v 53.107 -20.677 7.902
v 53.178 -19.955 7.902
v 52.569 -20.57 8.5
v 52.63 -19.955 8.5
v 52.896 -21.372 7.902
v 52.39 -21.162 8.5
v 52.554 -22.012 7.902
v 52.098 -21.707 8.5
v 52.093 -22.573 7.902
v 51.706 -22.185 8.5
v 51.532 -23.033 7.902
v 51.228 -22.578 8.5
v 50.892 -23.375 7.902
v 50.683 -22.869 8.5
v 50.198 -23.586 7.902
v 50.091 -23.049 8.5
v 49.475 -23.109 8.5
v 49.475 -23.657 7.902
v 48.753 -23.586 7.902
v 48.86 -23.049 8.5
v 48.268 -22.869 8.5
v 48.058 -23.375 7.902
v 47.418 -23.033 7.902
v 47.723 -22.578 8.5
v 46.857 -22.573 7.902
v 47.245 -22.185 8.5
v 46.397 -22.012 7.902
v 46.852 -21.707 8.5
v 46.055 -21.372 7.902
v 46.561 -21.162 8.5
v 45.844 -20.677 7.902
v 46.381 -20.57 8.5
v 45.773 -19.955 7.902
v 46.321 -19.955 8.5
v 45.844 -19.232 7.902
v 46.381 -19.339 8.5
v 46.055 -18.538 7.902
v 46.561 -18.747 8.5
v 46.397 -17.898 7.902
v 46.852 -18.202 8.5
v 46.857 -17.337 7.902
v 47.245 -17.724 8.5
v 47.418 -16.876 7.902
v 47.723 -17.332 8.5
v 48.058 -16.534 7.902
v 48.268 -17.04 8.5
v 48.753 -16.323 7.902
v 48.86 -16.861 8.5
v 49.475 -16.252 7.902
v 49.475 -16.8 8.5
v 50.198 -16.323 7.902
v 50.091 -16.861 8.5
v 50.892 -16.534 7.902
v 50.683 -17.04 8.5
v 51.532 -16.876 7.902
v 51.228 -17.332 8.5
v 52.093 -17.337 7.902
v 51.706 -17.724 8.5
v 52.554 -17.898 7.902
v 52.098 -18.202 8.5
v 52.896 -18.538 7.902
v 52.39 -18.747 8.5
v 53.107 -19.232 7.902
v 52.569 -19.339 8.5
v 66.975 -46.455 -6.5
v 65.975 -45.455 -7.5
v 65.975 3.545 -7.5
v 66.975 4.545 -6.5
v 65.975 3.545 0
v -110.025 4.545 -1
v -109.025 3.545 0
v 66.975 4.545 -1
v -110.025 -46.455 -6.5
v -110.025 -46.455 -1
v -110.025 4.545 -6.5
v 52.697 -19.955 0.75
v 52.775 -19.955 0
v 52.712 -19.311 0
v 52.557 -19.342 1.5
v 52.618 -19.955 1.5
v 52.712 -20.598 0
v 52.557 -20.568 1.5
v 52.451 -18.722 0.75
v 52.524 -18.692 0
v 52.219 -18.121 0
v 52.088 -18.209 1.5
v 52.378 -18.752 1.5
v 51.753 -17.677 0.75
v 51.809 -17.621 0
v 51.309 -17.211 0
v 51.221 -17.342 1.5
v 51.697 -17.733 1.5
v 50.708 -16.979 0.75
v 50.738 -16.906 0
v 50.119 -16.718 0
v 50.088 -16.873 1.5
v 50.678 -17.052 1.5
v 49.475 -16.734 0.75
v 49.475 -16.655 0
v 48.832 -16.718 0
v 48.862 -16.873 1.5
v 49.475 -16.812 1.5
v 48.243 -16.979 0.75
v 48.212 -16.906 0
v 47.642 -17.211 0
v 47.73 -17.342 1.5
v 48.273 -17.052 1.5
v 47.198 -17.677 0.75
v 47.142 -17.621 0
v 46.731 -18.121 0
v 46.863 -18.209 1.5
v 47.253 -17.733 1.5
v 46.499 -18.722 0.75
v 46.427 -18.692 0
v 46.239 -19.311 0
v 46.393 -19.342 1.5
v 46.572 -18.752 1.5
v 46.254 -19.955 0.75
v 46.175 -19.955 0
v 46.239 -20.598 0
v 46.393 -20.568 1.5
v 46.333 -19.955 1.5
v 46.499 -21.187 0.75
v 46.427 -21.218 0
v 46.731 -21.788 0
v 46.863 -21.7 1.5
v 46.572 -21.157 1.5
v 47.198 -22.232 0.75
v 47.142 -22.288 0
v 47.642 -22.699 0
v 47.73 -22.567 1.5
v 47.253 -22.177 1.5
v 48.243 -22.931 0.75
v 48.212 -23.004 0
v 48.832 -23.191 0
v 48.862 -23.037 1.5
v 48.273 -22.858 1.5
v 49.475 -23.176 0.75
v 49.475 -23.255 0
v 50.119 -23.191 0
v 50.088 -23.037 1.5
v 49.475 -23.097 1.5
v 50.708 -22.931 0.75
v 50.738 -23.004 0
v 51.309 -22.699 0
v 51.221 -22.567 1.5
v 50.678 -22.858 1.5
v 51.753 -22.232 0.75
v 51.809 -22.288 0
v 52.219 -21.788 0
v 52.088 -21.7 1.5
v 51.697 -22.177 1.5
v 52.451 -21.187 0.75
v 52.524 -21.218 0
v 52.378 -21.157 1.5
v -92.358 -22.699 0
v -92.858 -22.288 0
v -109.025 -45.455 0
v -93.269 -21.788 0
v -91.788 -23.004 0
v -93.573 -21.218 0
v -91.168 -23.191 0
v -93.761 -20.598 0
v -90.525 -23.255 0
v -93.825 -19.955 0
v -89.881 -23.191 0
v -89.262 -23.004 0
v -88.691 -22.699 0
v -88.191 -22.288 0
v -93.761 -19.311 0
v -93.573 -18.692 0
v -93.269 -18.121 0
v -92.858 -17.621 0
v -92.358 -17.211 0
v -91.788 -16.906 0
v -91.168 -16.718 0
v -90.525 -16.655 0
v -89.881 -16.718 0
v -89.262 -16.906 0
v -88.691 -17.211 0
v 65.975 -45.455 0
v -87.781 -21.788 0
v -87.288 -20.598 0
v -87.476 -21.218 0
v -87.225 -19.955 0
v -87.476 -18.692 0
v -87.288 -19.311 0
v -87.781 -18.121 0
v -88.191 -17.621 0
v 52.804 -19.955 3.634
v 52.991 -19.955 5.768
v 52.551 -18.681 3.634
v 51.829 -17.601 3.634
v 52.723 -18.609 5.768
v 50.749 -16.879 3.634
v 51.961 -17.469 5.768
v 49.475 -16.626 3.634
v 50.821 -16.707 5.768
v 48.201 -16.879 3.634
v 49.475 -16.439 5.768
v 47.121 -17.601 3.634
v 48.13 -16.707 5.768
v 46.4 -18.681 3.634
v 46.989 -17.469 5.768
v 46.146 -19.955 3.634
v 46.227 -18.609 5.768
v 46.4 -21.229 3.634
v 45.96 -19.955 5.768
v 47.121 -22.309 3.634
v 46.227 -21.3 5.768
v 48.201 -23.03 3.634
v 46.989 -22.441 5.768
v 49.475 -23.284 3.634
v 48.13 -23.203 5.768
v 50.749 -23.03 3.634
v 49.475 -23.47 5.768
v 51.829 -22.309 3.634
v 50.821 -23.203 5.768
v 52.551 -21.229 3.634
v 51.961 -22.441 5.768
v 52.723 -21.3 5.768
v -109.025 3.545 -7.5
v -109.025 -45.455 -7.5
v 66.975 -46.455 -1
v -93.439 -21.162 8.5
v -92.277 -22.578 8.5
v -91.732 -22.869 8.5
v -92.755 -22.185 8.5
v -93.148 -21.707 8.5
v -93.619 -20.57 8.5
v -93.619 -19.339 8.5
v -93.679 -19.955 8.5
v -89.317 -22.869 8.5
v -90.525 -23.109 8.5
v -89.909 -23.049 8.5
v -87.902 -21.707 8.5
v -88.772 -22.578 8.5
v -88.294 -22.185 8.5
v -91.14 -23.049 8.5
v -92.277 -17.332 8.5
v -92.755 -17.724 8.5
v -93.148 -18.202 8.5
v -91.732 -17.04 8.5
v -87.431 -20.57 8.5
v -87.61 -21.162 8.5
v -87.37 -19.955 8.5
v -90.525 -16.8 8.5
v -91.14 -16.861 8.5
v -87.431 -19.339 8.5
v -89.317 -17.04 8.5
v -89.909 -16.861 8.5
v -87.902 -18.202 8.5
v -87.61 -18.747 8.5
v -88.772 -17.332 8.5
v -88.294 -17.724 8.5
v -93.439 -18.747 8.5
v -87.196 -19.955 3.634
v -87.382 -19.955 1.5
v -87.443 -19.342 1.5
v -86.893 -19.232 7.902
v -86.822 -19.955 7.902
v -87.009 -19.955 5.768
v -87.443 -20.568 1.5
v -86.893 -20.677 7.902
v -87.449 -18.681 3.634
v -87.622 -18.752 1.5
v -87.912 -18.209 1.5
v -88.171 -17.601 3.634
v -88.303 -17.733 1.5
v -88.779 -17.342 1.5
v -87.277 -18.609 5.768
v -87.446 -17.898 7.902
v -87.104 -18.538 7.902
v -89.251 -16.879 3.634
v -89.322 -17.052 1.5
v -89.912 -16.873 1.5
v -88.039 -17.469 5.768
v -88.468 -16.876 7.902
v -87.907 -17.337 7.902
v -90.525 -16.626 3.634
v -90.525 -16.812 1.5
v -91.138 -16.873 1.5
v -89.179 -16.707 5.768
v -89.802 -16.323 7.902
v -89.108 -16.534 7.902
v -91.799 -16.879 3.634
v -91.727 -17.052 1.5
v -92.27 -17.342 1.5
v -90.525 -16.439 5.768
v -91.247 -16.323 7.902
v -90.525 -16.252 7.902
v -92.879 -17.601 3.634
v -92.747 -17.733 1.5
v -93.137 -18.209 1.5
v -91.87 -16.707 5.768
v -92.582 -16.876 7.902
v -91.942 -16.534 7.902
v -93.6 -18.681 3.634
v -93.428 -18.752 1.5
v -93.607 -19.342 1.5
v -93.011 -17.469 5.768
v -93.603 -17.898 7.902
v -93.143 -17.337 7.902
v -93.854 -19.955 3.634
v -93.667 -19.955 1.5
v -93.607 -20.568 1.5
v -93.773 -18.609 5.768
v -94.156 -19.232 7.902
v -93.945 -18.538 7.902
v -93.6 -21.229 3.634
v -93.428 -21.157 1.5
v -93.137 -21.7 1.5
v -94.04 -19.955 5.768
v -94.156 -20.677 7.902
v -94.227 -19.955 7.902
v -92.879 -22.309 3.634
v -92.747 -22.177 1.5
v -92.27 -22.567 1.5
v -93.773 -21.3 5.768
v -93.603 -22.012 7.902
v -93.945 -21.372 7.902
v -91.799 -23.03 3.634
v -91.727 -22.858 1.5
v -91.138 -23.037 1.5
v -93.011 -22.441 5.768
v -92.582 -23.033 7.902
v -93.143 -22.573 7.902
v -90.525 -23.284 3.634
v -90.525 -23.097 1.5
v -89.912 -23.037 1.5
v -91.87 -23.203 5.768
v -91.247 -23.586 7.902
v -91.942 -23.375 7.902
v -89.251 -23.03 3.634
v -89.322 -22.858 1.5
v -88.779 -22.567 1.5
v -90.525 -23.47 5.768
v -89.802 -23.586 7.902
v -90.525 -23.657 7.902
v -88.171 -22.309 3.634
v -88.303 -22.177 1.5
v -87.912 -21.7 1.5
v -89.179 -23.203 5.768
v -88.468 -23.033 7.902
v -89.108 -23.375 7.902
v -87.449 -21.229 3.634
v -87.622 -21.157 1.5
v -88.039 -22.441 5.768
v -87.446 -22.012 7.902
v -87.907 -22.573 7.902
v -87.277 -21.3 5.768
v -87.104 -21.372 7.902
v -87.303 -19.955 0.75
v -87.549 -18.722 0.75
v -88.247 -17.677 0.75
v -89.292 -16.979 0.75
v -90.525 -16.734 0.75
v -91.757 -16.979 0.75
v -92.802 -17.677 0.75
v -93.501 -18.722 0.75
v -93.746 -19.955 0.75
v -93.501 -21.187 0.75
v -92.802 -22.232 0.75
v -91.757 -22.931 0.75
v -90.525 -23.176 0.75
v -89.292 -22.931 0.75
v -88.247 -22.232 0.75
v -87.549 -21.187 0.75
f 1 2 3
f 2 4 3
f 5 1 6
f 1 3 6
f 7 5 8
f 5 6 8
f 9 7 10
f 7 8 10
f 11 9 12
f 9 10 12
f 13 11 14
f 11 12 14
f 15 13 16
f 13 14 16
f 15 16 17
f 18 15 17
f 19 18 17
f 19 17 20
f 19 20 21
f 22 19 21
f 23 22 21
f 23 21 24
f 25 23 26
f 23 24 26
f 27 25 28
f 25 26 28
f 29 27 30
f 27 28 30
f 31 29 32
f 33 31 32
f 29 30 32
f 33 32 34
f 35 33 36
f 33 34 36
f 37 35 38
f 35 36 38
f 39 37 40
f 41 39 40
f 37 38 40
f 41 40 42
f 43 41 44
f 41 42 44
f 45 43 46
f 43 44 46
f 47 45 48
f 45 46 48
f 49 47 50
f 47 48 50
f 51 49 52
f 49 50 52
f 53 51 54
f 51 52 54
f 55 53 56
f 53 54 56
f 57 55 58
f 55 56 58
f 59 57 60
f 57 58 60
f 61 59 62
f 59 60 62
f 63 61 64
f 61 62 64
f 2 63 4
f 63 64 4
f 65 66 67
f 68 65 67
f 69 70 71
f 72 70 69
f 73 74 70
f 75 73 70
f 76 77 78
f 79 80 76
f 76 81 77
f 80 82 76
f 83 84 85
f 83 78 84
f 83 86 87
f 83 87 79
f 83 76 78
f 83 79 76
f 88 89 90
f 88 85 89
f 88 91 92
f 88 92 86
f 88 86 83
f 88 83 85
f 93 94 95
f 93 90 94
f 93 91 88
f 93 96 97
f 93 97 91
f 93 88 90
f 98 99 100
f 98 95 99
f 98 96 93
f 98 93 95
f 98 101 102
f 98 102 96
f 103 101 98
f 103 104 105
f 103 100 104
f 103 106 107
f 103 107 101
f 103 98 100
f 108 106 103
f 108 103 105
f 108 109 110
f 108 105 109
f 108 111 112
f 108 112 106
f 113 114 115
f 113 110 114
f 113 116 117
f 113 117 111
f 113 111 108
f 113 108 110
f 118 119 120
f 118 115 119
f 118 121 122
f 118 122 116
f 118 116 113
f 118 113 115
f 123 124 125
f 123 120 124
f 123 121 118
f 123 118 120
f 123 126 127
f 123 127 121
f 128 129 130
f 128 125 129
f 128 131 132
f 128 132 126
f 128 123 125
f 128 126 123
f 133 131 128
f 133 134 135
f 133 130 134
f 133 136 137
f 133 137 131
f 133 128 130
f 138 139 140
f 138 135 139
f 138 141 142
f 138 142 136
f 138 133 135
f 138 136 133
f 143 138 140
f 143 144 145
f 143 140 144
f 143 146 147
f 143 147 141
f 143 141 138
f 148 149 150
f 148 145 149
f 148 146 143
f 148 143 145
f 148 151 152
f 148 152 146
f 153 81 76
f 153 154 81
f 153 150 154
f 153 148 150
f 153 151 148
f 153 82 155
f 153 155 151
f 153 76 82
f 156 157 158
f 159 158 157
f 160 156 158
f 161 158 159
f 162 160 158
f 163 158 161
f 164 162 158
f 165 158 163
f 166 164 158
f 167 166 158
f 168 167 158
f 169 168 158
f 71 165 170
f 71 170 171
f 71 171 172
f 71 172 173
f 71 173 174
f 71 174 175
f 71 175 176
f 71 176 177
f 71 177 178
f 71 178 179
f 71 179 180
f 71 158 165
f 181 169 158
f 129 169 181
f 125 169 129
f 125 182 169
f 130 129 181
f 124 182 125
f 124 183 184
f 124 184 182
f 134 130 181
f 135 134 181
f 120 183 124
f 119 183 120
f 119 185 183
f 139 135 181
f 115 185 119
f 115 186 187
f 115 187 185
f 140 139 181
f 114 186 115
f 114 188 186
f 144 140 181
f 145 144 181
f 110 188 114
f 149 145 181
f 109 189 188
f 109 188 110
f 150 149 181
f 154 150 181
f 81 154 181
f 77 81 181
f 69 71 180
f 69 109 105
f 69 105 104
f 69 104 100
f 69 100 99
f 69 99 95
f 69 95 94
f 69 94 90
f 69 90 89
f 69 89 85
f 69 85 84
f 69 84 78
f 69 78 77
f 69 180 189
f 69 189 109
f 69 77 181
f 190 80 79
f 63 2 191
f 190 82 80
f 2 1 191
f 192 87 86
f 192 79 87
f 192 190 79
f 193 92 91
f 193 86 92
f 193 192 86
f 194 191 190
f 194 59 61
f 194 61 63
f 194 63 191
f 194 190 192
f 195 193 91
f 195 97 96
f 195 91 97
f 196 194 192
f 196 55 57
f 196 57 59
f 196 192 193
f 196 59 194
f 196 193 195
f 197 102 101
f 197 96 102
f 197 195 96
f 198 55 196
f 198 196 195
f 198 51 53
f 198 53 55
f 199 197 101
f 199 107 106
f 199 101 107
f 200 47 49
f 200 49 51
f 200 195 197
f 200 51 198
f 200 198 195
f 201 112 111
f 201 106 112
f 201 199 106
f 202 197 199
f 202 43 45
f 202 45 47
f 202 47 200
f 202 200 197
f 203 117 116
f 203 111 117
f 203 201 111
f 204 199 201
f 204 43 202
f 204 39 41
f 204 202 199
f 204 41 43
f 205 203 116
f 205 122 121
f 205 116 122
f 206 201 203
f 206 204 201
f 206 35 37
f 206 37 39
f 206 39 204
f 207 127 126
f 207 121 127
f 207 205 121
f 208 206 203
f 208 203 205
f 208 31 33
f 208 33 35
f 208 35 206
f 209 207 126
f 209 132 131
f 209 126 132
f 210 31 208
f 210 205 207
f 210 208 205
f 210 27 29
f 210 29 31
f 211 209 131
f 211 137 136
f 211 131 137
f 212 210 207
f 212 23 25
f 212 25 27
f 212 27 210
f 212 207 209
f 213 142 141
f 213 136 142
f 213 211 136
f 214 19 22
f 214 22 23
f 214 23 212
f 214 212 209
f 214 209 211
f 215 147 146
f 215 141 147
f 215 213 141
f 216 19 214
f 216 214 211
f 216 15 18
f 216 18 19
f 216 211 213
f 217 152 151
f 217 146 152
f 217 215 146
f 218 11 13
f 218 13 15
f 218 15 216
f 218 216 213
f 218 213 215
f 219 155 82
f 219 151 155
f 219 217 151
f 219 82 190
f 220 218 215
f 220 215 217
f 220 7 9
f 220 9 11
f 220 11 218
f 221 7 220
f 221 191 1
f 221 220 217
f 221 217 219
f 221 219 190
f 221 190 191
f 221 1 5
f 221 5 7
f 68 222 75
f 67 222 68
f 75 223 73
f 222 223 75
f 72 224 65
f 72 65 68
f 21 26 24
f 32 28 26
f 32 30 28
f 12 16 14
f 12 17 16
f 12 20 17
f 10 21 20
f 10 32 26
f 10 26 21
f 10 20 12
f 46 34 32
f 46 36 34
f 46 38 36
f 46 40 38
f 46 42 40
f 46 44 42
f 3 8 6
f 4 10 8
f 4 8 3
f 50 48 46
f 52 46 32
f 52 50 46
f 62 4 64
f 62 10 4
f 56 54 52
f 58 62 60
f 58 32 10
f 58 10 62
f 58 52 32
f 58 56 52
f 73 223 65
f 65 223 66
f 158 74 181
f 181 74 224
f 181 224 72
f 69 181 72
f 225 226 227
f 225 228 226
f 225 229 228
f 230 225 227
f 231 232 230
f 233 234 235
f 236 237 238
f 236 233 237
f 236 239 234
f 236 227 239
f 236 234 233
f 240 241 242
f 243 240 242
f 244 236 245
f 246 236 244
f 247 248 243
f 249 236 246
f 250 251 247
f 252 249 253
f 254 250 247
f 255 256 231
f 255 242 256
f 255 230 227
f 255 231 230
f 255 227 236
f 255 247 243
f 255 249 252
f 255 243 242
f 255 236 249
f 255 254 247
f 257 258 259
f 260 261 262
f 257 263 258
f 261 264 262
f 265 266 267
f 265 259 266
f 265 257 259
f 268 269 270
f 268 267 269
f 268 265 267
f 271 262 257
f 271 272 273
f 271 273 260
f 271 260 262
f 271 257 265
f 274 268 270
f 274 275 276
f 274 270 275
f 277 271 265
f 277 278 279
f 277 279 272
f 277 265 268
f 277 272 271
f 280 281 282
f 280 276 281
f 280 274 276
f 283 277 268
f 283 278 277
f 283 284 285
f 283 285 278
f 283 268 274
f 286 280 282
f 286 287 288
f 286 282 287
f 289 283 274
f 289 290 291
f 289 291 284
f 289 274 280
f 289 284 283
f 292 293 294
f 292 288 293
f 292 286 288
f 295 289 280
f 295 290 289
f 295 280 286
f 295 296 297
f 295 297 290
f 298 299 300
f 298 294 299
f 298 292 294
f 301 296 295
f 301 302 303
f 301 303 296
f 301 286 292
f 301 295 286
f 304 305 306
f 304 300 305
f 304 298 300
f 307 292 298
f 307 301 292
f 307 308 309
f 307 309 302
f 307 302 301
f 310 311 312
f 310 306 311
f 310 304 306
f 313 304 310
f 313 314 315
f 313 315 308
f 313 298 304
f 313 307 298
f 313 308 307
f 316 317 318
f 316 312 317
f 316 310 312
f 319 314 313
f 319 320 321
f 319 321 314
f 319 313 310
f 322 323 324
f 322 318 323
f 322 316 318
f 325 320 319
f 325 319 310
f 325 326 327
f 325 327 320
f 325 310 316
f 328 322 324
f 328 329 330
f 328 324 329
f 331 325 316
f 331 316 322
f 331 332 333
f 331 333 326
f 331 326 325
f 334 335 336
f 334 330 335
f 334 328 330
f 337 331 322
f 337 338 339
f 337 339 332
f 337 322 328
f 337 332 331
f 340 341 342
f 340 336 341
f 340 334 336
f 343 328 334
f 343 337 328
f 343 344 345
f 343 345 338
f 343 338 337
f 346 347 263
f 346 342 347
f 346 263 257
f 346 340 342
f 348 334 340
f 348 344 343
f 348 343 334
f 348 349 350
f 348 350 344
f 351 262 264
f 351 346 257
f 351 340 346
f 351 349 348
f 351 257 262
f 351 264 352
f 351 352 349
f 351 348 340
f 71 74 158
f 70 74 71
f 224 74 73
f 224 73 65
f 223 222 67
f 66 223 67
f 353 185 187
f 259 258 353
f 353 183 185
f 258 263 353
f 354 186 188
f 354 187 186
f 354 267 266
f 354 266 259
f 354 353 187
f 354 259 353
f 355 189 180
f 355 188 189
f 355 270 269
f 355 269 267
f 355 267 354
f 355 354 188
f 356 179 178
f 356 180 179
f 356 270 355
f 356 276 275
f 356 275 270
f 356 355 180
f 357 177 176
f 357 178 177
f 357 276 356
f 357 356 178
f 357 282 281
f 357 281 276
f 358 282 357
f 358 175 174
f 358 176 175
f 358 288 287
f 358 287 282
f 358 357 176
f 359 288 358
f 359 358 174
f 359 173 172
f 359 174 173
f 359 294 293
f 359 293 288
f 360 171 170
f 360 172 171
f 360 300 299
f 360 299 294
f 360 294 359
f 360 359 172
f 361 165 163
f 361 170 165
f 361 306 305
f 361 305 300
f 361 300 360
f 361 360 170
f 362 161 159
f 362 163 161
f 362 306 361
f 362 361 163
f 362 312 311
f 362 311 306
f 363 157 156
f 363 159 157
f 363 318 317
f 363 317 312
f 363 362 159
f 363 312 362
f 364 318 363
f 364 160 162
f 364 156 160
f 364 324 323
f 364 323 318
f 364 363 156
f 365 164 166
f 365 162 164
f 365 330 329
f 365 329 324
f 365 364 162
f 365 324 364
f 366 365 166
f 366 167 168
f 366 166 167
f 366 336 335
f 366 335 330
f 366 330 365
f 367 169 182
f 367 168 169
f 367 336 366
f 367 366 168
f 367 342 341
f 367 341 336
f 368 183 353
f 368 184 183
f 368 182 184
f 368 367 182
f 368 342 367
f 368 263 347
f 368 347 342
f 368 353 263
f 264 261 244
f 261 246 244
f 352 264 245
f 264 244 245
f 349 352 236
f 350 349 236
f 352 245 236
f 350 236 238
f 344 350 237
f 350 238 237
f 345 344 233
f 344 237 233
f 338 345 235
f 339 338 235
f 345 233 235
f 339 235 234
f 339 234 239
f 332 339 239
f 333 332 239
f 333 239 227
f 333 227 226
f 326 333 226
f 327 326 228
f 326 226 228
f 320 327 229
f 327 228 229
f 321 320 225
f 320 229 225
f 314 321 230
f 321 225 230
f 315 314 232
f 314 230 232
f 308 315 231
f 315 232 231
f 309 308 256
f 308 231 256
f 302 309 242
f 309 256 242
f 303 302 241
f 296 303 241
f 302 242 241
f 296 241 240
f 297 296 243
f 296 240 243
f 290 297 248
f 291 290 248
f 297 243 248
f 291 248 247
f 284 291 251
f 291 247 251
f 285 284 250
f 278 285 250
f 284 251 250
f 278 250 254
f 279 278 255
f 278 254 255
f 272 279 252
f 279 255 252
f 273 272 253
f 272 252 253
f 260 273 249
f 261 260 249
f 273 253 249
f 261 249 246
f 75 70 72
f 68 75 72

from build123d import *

# Parameters (mm, degrees)
F0_W      = 177
F0_H      = 51
F0_R      = 3.3
F1_DEPTH  = 7.5
F2_DEPTH  = 1.5
F2_TAPER  = 6
F2_FACE_R = 3.1423436471
F3_DEPTH  = 7
F3_TAPER  = -5
F5_SIZE   = 1


# Not quite as in the source:
# - a fillet or chamfer that OpenCascade refuses, or shapes differently, is made with other operations: its cross-section is extruded or revolved along the edge and cut away or added


with BuildPart() as f1:
    # F0 (on Top) → F1 (new body)
    with BuildSketch(Plane.XY):
        with Locations((-21.5246523023, -20.9546978474)):
            Rectangle(F0_W, F0_H)
        with Locations((-90.5246523023, -19.9546978474)):
            Circle(F0_R, mode=Mode.SUBTRACT)
        with Locations((49.4753476977, -19.9546978474)):
            Circle(F0_R, mode=Mode.SUBTRACT)
        with Locations((-90.5246523023, -19.9546978474)):
            Circle(F0_R)
        with Locations((49.4753476977, -19.9546978474)):
            Circle(F0_R)
    extrude(amount=-F1_DEPTH)

    # F0 (on Top) → F2 (join)
    with BuildSketch(Plane.XY):
        with Locations((-90.5246523023, -19.9546978474)):
            Circle(F0_R)
        with Locations((49.4753476977, -19.9546978474)):
            Circle(F0_R)
    extrude(amount=F2_DEPTH, taper=F2_TAPER)

    # F2_face (on face) → F3 (join)
    with BuildSketch(Plane(origin=(49.4753476977, -19.9546978474, 1.5), x_dir=(1, 0, 0), z_dir=(0, 0, 1))):
        Circle(F2_FACE_R)
        with Locations((-140, 0)):
            Circle(F2_FACE_R)
    extrude(amount=F3_DEPTH, taper=F3_TAPER)

    # F4: chamfer of 0.6 on 2 edges, made by hand

    # F4_s1 → F4_t2 (revolve, cut)
    with BuildSketch(Plane.XZ.offset(19.9546978474)):
        Polygon((-86.8221814561, 7.9022831811), (-87.3698880105, 8.5), (-86.7698880105, 8.5), align=None)
    revolve(axis=Axis((-90.5246523023, -19.9546978474, 8.5), (0, 0, -1)), mode=Mode.SUBTRACT)

    # F4_s3 → F4_t4 (revolve, cut)
    with BuildSketch(Plane.XZ.offset(19.9546978474)):
        Polygon((53.1778185439, 7.9022831811), (52.6301119895, 8.5), (53.2301119895, 8.5), align=None)
    revolve(axis=Axis((49.4753476977, -19.9546978474, 8.5), (0, 0, -1)), mode=Mode.SUBTRACT)

    # F5
    f5_edges = [f1.edges().sort_by_distance(p)[0] for p in [
        (-110.024652, -20.954698, 0),
        (-21.524652, 4.545302, 0),
        (-21.524652, -46.454698, 0),
        (66.975348, -20.954698, 0),
        (-21.524652, 4.545302, -7.5),
        (-110.024652, -20.954698, -7.5),
        (-21.524652, -46.454698, -7.5),
        (66.975348, -20.954698, -7.5),
    ]]
    chamfer(f5_edges, length=F5_SIZE)


solid = f1.part
